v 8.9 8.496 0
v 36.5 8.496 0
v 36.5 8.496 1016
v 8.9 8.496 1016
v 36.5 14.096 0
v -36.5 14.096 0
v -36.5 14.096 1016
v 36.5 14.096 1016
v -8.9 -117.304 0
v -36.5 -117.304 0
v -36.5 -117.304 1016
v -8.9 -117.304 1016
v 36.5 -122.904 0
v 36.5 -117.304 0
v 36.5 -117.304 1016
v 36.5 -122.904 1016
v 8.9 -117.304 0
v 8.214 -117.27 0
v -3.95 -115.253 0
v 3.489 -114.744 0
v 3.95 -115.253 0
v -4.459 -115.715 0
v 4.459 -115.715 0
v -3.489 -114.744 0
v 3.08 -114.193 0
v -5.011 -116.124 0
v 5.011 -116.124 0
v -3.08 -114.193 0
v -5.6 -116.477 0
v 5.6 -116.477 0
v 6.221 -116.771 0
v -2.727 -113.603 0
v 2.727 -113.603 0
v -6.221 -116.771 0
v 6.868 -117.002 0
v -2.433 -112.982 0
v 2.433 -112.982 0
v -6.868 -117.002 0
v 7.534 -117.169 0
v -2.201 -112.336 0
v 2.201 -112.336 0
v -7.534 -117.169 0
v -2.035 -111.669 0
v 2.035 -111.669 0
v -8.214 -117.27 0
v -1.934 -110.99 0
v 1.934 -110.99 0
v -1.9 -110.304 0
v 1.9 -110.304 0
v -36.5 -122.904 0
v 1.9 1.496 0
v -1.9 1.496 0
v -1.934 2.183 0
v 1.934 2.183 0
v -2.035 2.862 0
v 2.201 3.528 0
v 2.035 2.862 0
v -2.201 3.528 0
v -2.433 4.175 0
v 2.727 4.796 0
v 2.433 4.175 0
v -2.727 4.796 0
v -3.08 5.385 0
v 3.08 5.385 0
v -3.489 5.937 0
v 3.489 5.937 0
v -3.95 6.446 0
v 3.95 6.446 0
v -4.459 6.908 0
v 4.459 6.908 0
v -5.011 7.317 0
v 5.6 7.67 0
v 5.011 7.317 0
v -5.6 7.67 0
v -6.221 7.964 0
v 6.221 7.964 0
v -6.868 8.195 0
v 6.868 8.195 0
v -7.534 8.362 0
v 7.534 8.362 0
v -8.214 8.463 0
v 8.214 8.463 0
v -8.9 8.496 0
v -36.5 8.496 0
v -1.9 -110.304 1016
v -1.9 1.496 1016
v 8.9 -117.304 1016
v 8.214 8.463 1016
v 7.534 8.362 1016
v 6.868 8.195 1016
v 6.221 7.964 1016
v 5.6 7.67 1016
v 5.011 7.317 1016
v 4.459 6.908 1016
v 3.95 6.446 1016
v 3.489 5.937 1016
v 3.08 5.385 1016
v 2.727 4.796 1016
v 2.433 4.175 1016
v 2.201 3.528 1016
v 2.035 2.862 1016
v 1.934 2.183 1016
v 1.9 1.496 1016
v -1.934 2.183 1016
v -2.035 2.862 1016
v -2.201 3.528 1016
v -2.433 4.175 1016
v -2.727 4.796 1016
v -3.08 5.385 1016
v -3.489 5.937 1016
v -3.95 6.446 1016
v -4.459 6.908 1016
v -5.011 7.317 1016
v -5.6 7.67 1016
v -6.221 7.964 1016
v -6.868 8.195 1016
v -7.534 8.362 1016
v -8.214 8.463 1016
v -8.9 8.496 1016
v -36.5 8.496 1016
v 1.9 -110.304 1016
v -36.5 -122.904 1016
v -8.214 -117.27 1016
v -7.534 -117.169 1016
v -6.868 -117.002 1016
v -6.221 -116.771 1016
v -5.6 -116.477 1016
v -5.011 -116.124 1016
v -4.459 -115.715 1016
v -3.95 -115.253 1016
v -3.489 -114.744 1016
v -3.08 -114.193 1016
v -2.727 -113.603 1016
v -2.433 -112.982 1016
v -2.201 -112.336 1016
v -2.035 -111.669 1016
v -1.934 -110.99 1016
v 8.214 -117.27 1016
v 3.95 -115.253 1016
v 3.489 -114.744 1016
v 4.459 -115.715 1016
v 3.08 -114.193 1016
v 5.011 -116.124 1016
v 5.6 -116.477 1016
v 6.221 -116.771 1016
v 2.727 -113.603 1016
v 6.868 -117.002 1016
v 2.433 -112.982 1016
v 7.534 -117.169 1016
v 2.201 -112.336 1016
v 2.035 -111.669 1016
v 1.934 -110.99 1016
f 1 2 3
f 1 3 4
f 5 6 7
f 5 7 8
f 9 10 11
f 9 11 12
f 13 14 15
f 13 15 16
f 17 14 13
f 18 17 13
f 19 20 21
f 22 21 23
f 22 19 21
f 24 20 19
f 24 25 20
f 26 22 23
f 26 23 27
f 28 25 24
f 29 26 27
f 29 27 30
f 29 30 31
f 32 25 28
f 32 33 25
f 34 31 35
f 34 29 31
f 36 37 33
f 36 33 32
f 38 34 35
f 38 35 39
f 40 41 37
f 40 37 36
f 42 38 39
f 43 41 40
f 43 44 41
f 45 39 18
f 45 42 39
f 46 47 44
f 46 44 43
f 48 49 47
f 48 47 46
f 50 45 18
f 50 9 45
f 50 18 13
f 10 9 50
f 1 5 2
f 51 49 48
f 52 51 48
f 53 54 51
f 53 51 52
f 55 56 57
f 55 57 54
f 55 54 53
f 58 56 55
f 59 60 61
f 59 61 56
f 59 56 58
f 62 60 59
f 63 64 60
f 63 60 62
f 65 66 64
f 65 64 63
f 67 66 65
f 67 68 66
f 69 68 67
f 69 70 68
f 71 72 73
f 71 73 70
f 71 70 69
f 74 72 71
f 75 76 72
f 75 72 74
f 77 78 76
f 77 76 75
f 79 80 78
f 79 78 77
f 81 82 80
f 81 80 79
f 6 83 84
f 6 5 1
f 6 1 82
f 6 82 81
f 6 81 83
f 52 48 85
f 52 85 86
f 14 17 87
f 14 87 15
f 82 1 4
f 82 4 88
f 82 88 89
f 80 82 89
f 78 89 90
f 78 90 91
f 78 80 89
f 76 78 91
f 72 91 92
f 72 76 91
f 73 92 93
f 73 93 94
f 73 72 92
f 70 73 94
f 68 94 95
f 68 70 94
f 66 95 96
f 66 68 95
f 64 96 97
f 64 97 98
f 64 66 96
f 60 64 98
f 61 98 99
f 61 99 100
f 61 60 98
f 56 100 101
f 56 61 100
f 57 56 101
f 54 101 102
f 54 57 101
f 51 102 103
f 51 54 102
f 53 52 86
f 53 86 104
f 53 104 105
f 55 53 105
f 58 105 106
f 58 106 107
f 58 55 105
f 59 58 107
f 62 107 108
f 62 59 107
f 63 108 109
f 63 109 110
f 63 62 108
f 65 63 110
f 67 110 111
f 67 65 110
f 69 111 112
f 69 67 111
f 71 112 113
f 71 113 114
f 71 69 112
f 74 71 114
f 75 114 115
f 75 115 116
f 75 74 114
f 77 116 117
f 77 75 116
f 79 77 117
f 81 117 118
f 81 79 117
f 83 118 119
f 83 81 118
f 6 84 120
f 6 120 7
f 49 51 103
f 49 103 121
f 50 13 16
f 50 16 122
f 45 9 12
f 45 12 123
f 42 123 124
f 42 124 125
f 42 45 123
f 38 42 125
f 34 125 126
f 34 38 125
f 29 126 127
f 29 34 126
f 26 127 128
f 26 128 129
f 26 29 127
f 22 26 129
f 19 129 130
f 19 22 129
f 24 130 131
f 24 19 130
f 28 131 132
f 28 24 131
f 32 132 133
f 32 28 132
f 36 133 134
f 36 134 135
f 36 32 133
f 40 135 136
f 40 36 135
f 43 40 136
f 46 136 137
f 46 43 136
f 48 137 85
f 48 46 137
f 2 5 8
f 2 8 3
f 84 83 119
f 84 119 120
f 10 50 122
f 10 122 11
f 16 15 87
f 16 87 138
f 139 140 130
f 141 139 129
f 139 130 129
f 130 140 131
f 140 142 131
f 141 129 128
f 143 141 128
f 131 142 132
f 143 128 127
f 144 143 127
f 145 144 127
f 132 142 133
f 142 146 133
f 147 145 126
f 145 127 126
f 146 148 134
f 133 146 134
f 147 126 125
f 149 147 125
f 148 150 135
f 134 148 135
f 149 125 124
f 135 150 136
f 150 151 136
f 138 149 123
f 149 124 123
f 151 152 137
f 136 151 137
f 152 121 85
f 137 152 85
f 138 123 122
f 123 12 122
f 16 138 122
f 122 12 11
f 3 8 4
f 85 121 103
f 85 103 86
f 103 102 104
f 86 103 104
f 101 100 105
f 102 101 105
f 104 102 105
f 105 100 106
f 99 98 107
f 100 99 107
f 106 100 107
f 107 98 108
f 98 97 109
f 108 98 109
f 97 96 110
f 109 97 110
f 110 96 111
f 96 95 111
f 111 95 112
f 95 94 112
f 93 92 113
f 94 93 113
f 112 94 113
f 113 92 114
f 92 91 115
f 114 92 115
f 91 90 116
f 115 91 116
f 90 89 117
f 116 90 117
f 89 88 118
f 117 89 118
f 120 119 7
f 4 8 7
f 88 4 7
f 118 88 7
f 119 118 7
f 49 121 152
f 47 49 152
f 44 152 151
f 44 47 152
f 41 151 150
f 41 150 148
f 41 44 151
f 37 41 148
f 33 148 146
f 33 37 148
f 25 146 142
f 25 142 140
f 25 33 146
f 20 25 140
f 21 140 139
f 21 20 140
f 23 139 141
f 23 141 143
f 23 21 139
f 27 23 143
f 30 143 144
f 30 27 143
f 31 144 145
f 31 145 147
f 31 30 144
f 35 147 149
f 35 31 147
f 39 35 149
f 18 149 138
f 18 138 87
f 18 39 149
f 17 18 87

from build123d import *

# Parameters (mm, degrees)
BOSS_EXTRUDE1_DEPTH = 1016


with BuildPart() as part:
    # Sketch1 → Boss-Extrude1 (new body)
    with BuildSketch(Plane.XY):
        with BuildLine():
            Line((-36.5, 14.096450845), (36.5, 14.096450845))
            Line((36.5, 14.096450845), (36.5, 8.496450845))
            Line((36.5, 8.496450845), (8.9, 8.496450845))
            ThreePointArc((8.9, 8.496450845), (3.950252532, 6.446198313), (1.9, 1.496450845))
            Line((1.9, 1.496450845), (1.9, -110.303549155))
            ThreePointArc((1.9, -110.303549155), (3.950252532, -115.253296624), (8.9, -117.303549155))
            Line((8.9, -117.303549155), (36.5, -117.303549155))
            Line((36.5, -117.303549155), (36.5, -122.903549155))
            Line((36.5, -122.903549155), (-36.5, -122.903549155))
            Line((-36.5, -122.903549155), (-36.5, -117.303549155))
            Line((-36.5, -117.303549155), (-8.9, -117.303549155))
            ThreePointArc((-8.9, -117.303549155), (-3.950252532, -115.253296624), (-1.9, -110.303549155))
            Line((-1.9, -110.303549155), (-1.9, 1.496450845))
            ThreePointArc((-1.9, 1.496450845), (-3.950252532, 6.446198313), (-8.9, 8.496450845))
            Line((-8.9, 8.496450845), (-36.5, 8.496450845))
            Line((-36.5, 8.496450845), (-36.5, 14.096450845))
        make_face()
    extrude(amount=BOSS_EXTRUDE1_DEPTH)


solid = part.part
